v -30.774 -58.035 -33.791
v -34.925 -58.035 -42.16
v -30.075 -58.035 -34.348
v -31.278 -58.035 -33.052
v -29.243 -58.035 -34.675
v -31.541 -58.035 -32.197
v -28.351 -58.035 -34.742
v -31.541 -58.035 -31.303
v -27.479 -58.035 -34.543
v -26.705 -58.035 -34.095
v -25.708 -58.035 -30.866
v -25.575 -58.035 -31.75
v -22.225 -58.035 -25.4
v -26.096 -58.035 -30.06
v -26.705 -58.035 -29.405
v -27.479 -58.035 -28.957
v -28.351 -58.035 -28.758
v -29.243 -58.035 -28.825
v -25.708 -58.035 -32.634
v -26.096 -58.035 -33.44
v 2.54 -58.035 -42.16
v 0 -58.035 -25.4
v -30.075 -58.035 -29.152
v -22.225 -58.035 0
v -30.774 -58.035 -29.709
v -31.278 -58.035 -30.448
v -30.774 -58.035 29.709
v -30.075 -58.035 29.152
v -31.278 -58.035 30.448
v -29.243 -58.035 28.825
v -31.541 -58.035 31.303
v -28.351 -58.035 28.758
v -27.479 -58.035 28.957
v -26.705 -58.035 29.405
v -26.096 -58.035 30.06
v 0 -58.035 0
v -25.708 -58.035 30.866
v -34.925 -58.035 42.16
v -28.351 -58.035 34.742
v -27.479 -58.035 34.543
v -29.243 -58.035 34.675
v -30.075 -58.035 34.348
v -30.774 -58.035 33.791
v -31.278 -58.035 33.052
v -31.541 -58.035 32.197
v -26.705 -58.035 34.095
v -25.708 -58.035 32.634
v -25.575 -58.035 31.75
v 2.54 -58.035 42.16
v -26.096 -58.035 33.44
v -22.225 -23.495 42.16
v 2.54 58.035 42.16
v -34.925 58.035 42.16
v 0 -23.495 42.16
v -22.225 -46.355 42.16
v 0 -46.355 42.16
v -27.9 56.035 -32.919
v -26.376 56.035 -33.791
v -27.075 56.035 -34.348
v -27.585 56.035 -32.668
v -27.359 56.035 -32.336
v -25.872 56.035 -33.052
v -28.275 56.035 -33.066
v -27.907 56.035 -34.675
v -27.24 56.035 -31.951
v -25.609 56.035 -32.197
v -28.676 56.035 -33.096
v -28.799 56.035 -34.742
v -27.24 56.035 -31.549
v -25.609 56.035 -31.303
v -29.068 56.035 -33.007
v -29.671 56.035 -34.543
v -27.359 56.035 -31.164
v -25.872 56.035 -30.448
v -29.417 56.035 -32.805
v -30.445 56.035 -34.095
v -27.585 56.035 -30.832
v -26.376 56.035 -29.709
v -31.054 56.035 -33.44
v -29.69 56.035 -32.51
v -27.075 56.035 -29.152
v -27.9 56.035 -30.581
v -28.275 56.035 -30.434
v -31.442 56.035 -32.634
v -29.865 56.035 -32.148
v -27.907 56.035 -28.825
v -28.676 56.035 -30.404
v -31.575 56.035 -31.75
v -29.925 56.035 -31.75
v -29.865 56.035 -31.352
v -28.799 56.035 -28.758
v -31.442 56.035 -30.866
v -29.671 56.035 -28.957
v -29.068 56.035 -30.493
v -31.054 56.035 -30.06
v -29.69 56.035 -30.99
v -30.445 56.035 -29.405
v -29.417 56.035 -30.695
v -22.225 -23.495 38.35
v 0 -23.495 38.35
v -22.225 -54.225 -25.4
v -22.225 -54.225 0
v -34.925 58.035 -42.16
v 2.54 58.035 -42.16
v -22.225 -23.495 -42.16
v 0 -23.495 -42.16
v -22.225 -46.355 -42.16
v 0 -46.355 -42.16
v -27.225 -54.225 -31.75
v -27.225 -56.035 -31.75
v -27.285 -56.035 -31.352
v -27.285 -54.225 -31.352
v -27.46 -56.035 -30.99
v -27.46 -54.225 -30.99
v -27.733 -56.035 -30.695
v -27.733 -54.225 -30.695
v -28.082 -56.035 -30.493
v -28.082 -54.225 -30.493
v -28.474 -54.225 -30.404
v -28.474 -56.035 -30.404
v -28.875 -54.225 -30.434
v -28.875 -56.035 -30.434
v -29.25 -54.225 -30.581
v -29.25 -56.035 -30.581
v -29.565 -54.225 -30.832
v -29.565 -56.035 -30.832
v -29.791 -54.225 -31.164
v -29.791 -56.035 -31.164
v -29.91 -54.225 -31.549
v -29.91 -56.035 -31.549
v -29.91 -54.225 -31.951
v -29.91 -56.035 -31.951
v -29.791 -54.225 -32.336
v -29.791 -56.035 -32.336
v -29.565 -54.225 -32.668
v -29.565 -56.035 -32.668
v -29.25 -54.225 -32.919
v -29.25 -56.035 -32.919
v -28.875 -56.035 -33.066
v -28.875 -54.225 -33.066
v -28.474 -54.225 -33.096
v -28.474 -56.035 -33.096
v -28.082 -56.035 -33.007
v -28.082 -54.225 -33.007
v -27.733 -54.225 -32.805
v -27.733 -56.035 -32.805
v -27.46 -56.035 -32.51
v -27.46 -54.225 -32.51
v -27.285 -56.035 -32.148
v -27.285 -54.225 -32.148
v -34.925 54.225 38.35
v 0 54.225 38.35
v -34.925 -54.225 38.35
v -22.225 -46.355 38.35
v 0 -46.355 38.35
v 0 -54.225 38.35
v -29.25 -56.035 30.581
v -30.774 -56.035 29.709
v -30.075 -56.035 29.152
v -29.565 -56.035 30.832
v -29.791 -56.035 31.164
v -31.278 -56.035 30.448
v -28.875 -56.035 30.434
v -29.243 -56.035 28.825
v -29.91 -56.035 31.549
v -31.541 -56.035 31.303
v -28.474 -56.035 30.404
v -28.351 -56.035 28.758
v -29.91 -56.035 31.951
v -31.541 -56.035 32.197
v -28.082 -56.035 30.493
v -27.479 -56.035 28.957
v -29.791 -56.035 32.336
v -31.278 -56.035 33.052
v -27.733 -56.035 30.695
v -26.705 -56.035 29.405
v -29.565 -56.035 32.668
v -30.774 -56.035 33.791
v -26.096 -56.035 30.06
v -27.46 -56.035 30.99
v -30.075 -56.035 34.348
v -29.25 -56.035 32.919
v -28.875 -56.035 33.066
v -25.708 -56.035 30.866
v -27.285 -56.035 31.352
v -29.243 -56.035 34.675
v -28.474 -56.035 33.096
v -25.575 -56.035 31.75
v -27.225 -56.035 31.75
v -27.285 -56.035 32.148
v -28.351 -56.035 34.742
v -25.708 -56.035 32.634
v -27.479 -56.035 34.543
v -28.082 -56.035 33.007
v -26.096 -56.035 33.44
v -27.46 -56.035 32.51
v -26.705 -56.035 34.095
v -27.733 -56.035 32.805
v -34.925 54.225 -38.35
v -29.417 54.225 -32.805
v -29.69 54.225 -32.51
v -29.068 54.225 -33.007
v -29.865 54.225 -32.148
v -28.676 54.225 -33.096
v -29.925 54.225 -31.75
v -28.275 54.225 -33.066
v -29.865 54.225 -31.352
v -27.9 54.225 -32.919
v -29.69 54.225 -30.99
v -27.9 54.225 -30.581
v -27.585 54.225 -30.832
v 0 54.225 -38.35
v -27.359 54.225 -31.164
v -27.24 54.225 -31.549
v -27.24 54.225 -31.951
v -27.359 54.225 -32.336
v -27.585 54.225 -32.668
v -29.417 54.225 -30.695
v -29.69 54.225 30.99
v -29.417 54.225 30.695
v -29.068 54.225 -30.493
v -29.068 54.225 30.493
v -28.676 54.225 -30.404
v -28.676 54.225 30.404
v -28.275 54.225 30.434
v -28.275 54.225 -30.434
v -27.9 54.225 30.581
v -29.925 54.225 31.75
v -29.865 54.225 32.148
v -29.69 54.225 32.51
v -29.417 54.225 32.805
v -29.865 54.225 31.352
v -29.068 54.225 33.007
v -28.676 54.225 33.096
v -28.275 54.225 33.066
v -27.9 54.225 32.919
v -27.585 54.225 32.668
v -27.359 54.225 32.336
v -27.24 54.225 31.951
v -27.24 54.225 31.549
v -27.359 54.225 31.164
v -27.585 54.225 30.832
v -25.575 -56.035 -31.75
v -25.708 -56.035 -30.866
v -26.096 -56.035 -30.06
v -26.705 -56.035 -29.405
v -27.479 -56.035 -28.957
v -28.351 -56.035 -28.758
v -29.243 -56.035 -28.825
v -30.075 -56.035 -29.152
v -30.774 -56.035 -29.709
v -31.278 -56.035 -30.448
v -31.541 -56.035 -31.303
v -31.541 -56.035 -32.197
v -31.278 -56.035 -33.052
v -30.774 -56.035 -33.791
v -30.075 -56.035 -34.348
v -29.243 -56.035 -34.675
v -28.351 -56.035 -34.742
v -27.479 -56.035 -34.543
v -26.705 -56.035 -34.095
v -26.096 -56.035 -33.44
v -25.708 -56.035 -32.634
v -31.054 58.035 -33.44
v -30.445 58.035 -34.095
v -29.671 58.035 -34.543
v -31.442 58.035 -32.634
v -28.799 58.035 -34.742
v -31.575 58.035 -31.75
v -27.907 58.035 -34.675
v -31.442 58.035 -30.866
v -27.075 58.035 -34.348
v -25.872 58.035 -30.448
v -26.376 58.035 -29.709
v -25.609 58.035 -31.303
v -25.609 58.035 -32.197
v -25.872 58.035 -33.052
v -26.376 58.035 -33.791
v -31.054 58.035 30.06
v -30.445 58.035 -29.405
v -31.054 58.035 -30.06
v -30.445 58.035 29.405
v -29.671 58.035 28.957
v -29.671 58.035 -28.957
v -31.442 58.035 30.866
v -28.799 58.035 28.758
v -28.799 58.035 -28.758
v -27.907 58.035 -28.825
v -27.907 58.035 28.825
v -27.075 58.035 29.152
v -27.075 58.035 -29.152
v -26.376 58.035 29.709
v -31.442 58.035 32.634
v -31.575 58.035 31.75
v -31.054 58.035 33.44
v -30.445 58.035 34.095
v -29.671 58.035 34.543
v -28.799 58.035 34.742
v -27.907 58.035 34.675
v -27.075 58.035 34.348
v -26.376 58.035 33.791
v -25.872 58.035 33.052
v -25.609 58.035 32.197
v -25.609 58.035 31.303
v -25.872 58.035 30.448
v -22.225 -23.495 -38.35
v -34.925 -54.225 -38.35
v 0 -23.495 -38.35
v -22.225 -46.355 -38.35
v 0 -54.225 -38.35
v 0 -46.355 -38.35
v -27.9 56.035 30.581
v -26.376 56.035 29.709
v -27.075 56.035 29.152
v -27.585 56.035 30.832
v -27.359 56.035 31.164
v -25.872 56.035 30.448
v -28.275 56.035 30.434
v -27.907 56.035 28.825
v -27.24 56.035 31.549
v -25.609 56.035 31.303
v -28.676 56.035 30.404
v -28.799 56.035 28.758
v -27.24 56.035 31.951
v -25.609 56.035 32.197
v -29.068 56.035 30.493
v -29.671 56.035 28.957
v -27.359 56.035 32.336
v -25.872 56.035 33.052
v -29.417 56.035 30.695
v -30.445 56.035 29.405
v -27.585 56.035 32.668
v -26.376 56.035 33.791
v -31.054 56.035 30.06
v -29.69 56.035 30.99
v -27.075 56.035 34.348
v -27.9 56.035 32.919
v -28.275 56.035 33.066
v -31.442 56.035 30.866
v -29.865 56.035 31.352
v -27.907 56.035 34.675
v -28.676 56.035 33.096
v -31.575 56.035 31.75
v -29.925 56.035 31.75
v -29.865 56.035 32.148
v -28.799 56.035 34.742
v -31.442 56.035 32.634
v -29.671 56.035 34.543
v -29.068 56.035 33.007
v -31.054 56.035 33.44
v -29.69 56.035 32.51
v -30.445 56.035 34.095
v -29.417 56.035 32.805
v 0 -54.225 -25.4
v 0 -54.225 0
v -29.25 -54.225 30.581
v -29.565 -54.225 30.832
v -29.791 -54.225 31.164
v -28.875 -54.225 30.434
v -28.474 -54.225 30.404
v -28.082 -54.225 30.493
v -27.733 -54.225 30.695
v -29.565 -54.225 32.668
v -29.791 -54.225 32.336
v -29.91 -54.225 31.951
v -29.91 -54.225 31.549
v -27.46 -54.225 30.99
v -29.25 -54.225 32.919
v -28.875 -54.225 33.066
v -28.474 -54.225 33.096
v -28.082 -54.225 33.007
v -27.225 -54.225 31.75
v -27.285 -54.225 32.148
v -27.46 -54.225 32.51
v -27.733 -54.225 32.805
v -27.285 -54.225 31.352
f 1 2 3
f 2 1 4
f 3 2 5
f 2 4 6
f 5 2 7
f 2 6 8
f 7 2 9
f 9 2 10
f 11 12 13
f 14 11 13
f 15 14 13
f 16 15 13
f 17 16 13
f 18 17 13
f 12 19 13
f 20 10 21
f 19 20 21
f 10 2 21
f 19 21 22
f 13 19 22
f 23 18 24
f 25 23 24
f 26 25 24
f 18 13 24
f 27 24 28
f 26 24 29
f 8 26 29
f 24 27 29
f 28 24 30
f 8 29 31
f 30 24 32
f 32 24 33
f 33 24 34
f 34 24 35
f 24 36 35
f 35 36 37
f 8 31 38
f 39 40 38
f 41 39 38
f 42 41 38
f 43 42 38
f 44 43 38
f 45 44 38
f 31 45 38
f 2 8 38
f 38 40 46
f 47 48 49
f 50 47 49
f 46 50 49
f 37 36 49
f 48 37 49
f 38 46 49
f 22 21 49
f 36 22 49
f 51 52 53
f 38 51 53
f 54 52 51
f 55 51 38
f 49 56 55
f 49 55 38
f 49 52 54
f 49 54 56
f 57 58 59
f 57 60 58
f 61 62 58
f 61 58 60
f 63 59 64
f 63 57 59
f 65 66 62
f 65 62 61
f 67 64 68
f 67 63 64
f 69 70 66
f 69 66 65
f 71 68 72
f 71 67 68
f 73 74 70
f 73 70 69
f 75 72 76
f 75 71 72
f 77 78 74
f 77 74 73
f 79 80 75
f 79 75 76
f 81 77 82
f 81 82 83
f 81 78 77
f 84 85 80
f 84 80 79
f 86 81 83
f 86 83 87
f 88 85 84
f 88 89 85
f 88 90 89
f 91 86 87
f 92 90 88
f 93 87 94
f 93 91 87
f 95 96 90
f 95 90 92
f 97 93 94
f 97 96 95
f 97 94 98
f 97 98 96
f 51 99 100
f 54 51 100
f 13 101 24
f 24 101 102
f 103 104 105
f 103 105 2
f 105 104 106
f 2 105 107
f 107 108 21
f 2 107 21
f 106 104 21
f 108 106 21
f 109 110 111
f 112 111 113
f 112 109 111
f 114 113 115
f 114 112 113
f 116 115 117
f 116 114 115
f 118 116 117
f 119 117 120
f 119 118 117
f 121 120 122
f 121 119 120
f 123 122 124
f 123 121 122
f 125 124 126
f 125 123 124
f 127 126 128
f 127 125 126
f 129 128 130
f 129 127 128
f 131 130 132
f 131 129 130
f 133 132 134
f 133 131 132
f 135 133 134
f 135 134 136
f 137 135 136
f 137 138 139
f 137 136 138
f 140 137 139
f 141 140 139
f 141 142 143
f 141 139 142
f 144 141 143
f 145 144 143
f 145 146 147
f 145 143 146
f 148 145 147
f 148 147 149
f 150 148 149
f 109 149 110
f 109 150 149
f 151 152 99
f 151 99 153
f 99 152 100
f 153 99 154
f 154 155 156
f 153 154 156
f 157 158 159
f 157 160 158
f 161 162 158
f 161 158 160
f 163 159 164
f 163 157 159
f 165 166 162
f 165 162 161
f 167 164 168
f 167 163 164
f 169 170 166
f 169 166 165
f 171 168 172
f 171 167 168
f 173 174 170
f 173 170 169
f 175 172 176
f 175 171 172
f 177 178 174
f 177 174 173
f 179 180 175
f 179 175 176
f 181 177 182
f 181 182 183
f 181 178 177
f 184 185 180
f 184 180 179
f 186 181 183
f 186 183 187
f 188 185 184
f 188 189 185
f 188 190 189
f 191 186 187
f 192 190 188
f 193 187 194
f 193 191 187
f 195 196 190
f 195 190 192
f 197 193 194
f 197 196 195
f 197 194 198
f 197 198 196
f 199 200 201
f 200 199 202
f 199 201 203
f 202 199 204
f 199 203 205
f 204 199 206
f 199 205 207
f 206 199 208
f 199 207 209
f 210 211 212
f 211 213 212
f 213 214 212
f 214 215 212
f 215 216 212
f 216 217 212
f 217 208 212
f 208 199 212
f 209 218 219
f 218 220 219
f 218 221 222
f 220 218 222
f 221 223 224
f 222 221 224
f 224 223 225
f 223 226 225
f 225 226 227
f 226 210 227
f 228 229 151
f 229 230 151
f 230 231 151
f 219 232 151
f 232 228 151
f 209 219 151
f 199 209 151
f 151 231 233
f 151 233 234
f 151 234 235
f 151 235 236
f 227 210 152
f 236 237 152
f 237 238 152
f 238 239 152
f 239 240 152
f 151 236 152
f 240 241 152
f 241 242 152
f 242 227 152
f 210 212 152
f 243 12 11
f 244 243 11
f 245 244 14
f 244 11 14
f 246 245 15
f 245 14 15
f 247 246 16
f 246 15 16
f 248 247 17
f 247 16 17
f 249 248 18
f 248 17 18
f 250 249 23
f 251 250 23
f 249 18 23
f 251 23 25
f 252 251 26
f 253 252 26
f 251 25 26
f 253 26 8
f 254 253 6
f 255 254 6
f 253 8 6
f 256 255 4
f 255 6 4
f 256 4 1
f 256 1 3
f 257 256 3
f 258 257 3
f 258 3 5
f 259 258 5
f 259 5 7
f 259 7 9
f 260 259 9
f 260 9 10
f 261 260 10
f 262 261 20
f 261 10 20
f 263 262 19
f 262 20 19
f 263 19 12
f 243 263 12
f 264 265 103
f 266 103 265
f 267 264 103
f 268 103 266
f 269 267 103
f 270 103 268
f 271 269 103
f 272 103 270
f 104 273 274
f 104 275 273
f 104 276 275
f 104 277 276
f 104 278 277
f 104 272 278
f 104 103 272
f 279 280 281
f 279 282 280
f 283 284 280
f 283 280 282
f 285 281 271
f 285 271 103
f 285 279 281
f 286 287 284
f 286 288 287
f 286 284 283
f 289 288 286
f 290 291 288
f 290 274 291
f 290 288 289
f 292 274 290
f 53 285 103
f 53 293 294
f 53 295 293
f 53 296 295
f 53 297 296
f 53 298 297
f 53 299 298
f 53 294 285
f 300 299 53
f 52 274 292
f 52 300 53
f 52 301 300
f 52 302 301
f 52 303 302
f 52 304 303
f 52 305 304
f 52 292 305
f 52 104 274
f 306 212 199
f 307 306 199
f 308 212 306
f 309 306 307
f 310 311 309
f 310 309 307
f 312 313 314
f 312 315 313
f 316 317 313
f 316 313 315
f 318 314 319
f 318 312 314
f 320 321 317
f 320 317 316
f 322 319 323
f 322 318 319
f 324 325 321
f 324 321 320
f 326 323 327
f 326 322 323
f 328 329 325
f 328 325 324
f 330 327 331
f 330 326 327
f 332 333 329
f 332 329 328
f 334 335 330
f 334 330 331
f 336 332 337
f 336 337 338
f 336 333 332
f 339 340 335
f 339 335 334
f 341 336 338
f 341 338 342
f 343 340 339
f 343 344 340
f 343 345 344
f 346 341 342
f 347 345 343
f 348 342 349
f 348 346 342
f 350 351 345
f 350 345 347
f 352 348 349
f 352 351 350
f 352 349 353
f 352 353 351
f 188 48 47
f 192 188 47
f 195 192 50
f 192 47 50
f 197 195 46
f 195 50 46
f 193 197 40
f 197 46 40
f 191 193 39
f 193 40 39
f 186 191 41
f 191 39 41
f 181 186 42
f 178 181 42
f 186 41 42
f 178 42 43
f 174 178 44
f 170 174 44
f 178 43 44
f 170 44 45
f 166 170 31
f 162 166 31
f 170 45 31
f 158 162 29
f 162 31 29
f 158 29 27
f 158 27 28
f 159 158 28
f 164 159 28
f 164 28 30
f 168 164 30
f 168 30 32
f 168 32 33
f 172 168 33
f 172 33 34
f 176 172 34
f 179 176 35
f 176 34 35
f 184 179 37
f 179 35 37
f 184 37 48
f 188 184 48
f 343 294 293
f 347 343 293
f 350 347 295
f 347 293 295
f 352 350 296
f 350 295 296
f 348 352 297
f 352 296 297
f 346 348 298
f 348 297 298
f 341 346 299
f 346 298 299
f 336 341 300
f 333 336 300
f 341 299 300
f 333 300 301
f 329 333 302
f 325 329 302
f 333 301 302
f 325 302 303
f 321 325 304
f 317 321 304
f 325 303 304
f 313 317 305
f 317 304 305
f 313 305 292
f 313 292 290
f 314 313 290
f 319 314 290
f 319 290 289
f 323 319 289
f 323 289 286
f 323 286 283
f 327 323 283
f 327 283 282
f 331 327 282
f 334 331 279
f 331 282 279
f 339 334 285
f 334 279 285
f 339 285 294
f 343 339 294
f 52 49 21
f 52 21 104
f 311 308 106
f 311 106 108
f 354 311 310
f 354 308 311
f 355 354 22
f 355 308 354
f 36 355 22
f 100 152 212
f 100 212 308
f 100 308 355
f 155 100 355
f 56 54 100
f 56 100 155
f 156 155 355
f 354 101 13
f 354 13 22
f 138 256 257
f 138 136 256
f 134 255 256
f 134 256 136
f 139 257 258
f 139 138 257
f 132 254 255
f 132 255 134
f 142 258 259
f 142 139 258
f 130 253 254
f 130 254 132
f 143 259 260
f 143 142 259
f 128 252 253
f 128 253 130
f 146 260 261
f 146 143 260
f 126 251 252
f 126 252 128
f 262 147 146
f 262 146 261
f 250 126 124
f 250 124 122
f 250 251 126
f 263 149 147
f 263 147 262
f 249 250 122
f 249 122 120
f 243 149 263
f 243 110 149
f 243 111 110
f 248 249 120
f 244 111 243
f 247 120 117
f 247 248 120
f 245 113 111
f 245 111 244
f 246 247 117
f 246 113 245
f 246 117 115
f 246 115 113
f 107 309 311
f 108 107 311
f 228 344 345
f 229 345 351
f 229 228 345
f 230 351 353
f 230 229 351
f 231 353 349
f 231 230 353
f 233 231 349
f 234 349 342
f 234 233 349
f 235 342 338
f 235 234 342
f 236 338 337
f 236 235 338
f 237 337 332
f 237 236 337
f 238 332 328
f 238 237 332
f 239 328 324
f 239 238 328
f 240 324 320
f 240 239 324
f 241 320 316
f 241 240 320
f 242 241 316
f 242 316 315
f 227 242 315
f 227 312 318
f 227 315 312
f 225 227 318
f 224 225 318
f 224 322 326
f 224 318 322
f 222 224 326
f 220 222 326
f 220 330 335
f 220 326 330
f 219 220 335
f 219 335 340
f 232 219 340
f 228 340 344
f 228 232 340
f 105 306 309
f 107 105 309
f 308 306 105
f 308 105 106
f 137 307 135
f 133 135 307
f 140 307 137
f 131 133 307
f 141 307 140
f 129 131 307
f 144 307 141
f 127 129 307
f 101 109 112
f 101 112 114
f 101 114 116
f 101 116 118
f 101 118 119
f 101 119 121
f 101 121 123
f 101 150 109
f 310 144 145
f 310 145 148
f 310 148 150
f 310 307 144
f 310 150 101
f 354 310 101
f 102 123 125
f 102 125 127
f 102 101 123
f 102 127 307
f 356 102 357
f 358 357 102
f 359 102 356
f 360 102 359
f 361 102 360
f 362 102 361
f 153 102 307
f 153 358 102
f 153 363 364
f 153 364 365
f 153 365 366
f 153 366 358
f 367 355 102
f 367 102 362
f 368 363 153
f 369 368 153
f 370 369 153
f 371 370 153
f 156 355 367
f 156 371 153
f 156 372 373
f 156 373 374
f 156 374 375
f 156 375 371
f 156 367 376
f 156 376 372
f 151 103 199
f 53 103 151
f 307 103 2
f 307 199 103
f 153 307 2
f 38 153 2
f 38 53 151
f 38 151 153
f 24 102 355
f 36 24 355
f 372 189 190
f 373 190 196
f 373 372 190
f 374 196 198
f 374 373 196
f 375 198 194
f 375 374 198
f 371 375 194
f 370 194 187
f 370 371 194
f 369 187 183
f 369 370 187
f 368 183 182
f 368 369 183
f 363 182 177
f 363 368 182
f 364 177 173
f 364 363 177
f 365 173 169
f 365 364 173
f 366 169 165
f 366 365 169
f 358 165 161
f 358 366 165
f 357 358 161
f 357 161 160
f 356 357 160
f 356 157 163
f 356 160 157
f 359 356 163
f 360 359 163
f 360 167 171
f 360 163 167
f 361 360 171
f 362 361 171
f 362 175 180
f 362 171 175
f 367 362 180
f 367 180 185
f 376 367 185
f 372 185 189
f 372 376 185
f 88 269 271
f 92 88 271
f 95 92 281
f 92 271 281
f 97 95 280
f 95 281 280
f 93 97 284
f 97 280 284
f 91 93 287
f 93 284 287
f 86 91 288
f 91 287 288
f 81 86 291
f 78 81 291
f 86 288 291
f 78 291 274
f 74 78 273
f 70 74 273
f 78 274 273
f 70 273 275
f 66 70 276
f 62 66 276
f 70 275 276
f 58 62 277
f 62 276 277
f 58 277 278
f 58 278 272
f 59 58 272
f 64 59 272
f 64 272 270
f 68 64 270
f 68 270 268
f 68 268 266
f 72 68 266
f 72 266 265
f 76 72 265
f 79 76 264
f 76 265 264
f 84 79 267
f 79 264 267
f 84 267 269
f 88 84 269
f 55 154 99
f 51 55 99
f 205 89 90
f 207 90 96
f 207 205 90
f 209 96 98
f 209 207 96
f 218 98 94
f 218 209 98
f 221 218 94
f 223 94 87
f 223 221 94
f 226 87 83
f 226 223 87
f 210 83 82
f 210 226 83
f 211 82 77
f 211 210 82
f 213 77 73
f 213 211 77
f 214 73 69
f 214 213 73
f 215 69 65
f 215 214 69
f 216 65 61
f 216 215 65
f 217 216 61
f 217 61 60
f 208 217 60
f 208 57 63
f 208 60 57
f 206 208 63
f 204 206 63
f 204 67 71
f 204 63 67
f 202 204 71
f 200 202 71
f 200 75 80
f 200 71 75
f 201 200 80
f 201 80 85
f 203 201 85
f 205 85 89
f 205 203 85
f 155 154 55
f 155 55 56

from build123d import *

# Parameters (mm, degrees)
SKETCH1_W           = 116.070000016
SKETCH1_H           = 84.320000016
BOSS_EXTRUDE1_DEPTH = 2.54
SKETCH2_W           = 116.070000016
SKETCH2_H           = 84.320000016
SKETCH2_W_2         = 108.450000016
SKETCH2_H_2         = 76.700000016
BOSS_EXTRUDE2_DEPTH = 34.925
CUT_EXTRUDE1_START  = 0.25
SKETCH4_R           = 1.349999967
CUT_EXTRUDE1_DEPTH  = 3.81
CUT_EXTRUDE2_START  = 0.25
SKETCH5_R           = 1.349999967
CUT_EXTRUDE2_DEPTH  = 3.81
SKETCH7_R           = 2.999999969
CUT_EXTRUDE3_DEPTH  = 2.000000064
SKETCH6_R           = 2.999999969
CUT_EXTRUDE4_DEPTH  = 2.000000064
CUT_EXTRUDE5_START  = 0.25
SKETCH11_W          = 22.225
SKETCH11_H          = 22.86
CUT_EXTRUDE5_DEPTH  = 3.81
CUT_EXTRUDE6_START  = 0.25
SKETCH8_W           = 22.225
SKETCH8_H           = 25.4
CUT_EXTRUDE6_DEPTH  = 3.81
CUT_EXTRUDE7_START  = 0.25
SKETCH10_W          = 22.225
SKETCH10_H          = 22.86
CUT_EXTRUDE7_DEPTH  = 3.81


with BuildPart() as part:
    # Sketch1 → Boss-Extrude1 (new body)
    with BuildSketch(Plane.YZ):
        Rectangle(SKETCH1_W, SKETCH1_H)
    extrude(amount=BOSS_EXTRUDE1_DEPTH)

    # Sketch2 → Boss-Extrude2 (add)
    with BuildSketch(Plane(origin=(0, 0, 0), x_dir=(0, -1, 0), z_dir=(-1, 0, 0))):
        Rectangle(SKETCH2_W, SKETCH2_H)
        Rectangle(SKETCH2_W_2, SKETCH2_H_2, mode=Mode.SUBTRACT)
    extrude(amount=BOSS_EXTRUDE2_DEPTH)

    # Sketch4 → Cut-Extrude1 (cut)
    with BuildSketch(Plane.XZ.offset(53.975).offset(CUT_EXTRUDE1_START)):
        with Locations((-28.575, 31.75)):
            Circle(SKETCH4_R)
        with Locations((-28.575, -31.75)):
            Circle(SKETCH4_R)
    extrude(amount=CUT_EXTRUDE1_DEPTH, mode=Mode.SUBTRACT)

    # Sketch5 → Cut-Extrude2 (cut)
    with BuildSketch(Plane(origin=(0, 53.975, 0), x_dir=(-1, 0, 0), z_dir=(0, 1, 0)).offset(CUT_EXTRUDE2_START)):
        with Locations((28.575, -31.75)):
            Circle(SKETCH5_R)
        with Locations((28.575, 31.75)):
            Circle(SKETCH5_R)
    extrude(amount=CUT_EXTRUDE2_DEPTH, mode=Mode.SUBTRACT)

    # Sketch7 → Cut-Extrude3 (cut)
    with BuildSketch(Plane(origin=(0, 58.035000008, 0), x_dir=(-1, 0, 0), z_dir=(0, 1, 0))):
        with Locations((28.575, -31.75)):
            Circle(SKETCH7_R)
        with Locations((28.575, 31.75)):
            Circle(SKETCH7_R)
    extrude(amount=-CUT_EXTRUDE3_DEPTH, mode=Mode.SUBTRACT)

    # Sketch6 → Cut-Extrude4 (cut)
    with BuildSketch(Plane.XZ.offset(58.035000008)):
        with Locations((-28.575, 31.75)):
            Circle(SKETCH6_R)
        with Locations((-28.575, -31.75)):
            Circle(SKETCH6_R)
    extrude(amount=-CUT_EXTRUDE4_DEPTH, mode=Mode.SUBTRACT)

    # Sketch11 → Cut-Extrude5 (cut)
    with BuildSketch(Plane(origin=(0, 0, -38.1), x_dir=(1, 0, 0), z_dir=(0, 0, -1)).offset(CUT_EXTRUDE5_START)):
        with Locations((-11.1125, 34.925)):
            Rectangle(SKETCH11_W, SKETCH11_H)
    extrude(amount=CUT_EXTRUDE5_DEPTH, mode=Mode.SUBTRACT)

    # Sketch8 → Cut-Extrude6 (cut)
    with BuildSketch(Plane.XZ.offset(53.975).offset(CUT_EXTRUDE6_START)):
        with Locations((-11.1125, -12.7)):
            Rectangle(SKETCH8_W, SKETCH8_H)
    extrude(amount=CUT_EXTRUDE6_DEPTH, mode=Mode.SUBTRACT)

    # Sketch10 → Cut-Extrude7 (cut)
    with BuildSketch(Plane.XY.offset(38.1).offset(CUT_EXTRUDE7_START)):
        with Locations((-11.1125, -34.925)):
            Rectangle(SKETCH10_W, SKETCH10_H)
    extrude(amount=CUT_EXTRUDE7_DEPTH, mode=Mode.SUBTRACT)


solid = part.part
